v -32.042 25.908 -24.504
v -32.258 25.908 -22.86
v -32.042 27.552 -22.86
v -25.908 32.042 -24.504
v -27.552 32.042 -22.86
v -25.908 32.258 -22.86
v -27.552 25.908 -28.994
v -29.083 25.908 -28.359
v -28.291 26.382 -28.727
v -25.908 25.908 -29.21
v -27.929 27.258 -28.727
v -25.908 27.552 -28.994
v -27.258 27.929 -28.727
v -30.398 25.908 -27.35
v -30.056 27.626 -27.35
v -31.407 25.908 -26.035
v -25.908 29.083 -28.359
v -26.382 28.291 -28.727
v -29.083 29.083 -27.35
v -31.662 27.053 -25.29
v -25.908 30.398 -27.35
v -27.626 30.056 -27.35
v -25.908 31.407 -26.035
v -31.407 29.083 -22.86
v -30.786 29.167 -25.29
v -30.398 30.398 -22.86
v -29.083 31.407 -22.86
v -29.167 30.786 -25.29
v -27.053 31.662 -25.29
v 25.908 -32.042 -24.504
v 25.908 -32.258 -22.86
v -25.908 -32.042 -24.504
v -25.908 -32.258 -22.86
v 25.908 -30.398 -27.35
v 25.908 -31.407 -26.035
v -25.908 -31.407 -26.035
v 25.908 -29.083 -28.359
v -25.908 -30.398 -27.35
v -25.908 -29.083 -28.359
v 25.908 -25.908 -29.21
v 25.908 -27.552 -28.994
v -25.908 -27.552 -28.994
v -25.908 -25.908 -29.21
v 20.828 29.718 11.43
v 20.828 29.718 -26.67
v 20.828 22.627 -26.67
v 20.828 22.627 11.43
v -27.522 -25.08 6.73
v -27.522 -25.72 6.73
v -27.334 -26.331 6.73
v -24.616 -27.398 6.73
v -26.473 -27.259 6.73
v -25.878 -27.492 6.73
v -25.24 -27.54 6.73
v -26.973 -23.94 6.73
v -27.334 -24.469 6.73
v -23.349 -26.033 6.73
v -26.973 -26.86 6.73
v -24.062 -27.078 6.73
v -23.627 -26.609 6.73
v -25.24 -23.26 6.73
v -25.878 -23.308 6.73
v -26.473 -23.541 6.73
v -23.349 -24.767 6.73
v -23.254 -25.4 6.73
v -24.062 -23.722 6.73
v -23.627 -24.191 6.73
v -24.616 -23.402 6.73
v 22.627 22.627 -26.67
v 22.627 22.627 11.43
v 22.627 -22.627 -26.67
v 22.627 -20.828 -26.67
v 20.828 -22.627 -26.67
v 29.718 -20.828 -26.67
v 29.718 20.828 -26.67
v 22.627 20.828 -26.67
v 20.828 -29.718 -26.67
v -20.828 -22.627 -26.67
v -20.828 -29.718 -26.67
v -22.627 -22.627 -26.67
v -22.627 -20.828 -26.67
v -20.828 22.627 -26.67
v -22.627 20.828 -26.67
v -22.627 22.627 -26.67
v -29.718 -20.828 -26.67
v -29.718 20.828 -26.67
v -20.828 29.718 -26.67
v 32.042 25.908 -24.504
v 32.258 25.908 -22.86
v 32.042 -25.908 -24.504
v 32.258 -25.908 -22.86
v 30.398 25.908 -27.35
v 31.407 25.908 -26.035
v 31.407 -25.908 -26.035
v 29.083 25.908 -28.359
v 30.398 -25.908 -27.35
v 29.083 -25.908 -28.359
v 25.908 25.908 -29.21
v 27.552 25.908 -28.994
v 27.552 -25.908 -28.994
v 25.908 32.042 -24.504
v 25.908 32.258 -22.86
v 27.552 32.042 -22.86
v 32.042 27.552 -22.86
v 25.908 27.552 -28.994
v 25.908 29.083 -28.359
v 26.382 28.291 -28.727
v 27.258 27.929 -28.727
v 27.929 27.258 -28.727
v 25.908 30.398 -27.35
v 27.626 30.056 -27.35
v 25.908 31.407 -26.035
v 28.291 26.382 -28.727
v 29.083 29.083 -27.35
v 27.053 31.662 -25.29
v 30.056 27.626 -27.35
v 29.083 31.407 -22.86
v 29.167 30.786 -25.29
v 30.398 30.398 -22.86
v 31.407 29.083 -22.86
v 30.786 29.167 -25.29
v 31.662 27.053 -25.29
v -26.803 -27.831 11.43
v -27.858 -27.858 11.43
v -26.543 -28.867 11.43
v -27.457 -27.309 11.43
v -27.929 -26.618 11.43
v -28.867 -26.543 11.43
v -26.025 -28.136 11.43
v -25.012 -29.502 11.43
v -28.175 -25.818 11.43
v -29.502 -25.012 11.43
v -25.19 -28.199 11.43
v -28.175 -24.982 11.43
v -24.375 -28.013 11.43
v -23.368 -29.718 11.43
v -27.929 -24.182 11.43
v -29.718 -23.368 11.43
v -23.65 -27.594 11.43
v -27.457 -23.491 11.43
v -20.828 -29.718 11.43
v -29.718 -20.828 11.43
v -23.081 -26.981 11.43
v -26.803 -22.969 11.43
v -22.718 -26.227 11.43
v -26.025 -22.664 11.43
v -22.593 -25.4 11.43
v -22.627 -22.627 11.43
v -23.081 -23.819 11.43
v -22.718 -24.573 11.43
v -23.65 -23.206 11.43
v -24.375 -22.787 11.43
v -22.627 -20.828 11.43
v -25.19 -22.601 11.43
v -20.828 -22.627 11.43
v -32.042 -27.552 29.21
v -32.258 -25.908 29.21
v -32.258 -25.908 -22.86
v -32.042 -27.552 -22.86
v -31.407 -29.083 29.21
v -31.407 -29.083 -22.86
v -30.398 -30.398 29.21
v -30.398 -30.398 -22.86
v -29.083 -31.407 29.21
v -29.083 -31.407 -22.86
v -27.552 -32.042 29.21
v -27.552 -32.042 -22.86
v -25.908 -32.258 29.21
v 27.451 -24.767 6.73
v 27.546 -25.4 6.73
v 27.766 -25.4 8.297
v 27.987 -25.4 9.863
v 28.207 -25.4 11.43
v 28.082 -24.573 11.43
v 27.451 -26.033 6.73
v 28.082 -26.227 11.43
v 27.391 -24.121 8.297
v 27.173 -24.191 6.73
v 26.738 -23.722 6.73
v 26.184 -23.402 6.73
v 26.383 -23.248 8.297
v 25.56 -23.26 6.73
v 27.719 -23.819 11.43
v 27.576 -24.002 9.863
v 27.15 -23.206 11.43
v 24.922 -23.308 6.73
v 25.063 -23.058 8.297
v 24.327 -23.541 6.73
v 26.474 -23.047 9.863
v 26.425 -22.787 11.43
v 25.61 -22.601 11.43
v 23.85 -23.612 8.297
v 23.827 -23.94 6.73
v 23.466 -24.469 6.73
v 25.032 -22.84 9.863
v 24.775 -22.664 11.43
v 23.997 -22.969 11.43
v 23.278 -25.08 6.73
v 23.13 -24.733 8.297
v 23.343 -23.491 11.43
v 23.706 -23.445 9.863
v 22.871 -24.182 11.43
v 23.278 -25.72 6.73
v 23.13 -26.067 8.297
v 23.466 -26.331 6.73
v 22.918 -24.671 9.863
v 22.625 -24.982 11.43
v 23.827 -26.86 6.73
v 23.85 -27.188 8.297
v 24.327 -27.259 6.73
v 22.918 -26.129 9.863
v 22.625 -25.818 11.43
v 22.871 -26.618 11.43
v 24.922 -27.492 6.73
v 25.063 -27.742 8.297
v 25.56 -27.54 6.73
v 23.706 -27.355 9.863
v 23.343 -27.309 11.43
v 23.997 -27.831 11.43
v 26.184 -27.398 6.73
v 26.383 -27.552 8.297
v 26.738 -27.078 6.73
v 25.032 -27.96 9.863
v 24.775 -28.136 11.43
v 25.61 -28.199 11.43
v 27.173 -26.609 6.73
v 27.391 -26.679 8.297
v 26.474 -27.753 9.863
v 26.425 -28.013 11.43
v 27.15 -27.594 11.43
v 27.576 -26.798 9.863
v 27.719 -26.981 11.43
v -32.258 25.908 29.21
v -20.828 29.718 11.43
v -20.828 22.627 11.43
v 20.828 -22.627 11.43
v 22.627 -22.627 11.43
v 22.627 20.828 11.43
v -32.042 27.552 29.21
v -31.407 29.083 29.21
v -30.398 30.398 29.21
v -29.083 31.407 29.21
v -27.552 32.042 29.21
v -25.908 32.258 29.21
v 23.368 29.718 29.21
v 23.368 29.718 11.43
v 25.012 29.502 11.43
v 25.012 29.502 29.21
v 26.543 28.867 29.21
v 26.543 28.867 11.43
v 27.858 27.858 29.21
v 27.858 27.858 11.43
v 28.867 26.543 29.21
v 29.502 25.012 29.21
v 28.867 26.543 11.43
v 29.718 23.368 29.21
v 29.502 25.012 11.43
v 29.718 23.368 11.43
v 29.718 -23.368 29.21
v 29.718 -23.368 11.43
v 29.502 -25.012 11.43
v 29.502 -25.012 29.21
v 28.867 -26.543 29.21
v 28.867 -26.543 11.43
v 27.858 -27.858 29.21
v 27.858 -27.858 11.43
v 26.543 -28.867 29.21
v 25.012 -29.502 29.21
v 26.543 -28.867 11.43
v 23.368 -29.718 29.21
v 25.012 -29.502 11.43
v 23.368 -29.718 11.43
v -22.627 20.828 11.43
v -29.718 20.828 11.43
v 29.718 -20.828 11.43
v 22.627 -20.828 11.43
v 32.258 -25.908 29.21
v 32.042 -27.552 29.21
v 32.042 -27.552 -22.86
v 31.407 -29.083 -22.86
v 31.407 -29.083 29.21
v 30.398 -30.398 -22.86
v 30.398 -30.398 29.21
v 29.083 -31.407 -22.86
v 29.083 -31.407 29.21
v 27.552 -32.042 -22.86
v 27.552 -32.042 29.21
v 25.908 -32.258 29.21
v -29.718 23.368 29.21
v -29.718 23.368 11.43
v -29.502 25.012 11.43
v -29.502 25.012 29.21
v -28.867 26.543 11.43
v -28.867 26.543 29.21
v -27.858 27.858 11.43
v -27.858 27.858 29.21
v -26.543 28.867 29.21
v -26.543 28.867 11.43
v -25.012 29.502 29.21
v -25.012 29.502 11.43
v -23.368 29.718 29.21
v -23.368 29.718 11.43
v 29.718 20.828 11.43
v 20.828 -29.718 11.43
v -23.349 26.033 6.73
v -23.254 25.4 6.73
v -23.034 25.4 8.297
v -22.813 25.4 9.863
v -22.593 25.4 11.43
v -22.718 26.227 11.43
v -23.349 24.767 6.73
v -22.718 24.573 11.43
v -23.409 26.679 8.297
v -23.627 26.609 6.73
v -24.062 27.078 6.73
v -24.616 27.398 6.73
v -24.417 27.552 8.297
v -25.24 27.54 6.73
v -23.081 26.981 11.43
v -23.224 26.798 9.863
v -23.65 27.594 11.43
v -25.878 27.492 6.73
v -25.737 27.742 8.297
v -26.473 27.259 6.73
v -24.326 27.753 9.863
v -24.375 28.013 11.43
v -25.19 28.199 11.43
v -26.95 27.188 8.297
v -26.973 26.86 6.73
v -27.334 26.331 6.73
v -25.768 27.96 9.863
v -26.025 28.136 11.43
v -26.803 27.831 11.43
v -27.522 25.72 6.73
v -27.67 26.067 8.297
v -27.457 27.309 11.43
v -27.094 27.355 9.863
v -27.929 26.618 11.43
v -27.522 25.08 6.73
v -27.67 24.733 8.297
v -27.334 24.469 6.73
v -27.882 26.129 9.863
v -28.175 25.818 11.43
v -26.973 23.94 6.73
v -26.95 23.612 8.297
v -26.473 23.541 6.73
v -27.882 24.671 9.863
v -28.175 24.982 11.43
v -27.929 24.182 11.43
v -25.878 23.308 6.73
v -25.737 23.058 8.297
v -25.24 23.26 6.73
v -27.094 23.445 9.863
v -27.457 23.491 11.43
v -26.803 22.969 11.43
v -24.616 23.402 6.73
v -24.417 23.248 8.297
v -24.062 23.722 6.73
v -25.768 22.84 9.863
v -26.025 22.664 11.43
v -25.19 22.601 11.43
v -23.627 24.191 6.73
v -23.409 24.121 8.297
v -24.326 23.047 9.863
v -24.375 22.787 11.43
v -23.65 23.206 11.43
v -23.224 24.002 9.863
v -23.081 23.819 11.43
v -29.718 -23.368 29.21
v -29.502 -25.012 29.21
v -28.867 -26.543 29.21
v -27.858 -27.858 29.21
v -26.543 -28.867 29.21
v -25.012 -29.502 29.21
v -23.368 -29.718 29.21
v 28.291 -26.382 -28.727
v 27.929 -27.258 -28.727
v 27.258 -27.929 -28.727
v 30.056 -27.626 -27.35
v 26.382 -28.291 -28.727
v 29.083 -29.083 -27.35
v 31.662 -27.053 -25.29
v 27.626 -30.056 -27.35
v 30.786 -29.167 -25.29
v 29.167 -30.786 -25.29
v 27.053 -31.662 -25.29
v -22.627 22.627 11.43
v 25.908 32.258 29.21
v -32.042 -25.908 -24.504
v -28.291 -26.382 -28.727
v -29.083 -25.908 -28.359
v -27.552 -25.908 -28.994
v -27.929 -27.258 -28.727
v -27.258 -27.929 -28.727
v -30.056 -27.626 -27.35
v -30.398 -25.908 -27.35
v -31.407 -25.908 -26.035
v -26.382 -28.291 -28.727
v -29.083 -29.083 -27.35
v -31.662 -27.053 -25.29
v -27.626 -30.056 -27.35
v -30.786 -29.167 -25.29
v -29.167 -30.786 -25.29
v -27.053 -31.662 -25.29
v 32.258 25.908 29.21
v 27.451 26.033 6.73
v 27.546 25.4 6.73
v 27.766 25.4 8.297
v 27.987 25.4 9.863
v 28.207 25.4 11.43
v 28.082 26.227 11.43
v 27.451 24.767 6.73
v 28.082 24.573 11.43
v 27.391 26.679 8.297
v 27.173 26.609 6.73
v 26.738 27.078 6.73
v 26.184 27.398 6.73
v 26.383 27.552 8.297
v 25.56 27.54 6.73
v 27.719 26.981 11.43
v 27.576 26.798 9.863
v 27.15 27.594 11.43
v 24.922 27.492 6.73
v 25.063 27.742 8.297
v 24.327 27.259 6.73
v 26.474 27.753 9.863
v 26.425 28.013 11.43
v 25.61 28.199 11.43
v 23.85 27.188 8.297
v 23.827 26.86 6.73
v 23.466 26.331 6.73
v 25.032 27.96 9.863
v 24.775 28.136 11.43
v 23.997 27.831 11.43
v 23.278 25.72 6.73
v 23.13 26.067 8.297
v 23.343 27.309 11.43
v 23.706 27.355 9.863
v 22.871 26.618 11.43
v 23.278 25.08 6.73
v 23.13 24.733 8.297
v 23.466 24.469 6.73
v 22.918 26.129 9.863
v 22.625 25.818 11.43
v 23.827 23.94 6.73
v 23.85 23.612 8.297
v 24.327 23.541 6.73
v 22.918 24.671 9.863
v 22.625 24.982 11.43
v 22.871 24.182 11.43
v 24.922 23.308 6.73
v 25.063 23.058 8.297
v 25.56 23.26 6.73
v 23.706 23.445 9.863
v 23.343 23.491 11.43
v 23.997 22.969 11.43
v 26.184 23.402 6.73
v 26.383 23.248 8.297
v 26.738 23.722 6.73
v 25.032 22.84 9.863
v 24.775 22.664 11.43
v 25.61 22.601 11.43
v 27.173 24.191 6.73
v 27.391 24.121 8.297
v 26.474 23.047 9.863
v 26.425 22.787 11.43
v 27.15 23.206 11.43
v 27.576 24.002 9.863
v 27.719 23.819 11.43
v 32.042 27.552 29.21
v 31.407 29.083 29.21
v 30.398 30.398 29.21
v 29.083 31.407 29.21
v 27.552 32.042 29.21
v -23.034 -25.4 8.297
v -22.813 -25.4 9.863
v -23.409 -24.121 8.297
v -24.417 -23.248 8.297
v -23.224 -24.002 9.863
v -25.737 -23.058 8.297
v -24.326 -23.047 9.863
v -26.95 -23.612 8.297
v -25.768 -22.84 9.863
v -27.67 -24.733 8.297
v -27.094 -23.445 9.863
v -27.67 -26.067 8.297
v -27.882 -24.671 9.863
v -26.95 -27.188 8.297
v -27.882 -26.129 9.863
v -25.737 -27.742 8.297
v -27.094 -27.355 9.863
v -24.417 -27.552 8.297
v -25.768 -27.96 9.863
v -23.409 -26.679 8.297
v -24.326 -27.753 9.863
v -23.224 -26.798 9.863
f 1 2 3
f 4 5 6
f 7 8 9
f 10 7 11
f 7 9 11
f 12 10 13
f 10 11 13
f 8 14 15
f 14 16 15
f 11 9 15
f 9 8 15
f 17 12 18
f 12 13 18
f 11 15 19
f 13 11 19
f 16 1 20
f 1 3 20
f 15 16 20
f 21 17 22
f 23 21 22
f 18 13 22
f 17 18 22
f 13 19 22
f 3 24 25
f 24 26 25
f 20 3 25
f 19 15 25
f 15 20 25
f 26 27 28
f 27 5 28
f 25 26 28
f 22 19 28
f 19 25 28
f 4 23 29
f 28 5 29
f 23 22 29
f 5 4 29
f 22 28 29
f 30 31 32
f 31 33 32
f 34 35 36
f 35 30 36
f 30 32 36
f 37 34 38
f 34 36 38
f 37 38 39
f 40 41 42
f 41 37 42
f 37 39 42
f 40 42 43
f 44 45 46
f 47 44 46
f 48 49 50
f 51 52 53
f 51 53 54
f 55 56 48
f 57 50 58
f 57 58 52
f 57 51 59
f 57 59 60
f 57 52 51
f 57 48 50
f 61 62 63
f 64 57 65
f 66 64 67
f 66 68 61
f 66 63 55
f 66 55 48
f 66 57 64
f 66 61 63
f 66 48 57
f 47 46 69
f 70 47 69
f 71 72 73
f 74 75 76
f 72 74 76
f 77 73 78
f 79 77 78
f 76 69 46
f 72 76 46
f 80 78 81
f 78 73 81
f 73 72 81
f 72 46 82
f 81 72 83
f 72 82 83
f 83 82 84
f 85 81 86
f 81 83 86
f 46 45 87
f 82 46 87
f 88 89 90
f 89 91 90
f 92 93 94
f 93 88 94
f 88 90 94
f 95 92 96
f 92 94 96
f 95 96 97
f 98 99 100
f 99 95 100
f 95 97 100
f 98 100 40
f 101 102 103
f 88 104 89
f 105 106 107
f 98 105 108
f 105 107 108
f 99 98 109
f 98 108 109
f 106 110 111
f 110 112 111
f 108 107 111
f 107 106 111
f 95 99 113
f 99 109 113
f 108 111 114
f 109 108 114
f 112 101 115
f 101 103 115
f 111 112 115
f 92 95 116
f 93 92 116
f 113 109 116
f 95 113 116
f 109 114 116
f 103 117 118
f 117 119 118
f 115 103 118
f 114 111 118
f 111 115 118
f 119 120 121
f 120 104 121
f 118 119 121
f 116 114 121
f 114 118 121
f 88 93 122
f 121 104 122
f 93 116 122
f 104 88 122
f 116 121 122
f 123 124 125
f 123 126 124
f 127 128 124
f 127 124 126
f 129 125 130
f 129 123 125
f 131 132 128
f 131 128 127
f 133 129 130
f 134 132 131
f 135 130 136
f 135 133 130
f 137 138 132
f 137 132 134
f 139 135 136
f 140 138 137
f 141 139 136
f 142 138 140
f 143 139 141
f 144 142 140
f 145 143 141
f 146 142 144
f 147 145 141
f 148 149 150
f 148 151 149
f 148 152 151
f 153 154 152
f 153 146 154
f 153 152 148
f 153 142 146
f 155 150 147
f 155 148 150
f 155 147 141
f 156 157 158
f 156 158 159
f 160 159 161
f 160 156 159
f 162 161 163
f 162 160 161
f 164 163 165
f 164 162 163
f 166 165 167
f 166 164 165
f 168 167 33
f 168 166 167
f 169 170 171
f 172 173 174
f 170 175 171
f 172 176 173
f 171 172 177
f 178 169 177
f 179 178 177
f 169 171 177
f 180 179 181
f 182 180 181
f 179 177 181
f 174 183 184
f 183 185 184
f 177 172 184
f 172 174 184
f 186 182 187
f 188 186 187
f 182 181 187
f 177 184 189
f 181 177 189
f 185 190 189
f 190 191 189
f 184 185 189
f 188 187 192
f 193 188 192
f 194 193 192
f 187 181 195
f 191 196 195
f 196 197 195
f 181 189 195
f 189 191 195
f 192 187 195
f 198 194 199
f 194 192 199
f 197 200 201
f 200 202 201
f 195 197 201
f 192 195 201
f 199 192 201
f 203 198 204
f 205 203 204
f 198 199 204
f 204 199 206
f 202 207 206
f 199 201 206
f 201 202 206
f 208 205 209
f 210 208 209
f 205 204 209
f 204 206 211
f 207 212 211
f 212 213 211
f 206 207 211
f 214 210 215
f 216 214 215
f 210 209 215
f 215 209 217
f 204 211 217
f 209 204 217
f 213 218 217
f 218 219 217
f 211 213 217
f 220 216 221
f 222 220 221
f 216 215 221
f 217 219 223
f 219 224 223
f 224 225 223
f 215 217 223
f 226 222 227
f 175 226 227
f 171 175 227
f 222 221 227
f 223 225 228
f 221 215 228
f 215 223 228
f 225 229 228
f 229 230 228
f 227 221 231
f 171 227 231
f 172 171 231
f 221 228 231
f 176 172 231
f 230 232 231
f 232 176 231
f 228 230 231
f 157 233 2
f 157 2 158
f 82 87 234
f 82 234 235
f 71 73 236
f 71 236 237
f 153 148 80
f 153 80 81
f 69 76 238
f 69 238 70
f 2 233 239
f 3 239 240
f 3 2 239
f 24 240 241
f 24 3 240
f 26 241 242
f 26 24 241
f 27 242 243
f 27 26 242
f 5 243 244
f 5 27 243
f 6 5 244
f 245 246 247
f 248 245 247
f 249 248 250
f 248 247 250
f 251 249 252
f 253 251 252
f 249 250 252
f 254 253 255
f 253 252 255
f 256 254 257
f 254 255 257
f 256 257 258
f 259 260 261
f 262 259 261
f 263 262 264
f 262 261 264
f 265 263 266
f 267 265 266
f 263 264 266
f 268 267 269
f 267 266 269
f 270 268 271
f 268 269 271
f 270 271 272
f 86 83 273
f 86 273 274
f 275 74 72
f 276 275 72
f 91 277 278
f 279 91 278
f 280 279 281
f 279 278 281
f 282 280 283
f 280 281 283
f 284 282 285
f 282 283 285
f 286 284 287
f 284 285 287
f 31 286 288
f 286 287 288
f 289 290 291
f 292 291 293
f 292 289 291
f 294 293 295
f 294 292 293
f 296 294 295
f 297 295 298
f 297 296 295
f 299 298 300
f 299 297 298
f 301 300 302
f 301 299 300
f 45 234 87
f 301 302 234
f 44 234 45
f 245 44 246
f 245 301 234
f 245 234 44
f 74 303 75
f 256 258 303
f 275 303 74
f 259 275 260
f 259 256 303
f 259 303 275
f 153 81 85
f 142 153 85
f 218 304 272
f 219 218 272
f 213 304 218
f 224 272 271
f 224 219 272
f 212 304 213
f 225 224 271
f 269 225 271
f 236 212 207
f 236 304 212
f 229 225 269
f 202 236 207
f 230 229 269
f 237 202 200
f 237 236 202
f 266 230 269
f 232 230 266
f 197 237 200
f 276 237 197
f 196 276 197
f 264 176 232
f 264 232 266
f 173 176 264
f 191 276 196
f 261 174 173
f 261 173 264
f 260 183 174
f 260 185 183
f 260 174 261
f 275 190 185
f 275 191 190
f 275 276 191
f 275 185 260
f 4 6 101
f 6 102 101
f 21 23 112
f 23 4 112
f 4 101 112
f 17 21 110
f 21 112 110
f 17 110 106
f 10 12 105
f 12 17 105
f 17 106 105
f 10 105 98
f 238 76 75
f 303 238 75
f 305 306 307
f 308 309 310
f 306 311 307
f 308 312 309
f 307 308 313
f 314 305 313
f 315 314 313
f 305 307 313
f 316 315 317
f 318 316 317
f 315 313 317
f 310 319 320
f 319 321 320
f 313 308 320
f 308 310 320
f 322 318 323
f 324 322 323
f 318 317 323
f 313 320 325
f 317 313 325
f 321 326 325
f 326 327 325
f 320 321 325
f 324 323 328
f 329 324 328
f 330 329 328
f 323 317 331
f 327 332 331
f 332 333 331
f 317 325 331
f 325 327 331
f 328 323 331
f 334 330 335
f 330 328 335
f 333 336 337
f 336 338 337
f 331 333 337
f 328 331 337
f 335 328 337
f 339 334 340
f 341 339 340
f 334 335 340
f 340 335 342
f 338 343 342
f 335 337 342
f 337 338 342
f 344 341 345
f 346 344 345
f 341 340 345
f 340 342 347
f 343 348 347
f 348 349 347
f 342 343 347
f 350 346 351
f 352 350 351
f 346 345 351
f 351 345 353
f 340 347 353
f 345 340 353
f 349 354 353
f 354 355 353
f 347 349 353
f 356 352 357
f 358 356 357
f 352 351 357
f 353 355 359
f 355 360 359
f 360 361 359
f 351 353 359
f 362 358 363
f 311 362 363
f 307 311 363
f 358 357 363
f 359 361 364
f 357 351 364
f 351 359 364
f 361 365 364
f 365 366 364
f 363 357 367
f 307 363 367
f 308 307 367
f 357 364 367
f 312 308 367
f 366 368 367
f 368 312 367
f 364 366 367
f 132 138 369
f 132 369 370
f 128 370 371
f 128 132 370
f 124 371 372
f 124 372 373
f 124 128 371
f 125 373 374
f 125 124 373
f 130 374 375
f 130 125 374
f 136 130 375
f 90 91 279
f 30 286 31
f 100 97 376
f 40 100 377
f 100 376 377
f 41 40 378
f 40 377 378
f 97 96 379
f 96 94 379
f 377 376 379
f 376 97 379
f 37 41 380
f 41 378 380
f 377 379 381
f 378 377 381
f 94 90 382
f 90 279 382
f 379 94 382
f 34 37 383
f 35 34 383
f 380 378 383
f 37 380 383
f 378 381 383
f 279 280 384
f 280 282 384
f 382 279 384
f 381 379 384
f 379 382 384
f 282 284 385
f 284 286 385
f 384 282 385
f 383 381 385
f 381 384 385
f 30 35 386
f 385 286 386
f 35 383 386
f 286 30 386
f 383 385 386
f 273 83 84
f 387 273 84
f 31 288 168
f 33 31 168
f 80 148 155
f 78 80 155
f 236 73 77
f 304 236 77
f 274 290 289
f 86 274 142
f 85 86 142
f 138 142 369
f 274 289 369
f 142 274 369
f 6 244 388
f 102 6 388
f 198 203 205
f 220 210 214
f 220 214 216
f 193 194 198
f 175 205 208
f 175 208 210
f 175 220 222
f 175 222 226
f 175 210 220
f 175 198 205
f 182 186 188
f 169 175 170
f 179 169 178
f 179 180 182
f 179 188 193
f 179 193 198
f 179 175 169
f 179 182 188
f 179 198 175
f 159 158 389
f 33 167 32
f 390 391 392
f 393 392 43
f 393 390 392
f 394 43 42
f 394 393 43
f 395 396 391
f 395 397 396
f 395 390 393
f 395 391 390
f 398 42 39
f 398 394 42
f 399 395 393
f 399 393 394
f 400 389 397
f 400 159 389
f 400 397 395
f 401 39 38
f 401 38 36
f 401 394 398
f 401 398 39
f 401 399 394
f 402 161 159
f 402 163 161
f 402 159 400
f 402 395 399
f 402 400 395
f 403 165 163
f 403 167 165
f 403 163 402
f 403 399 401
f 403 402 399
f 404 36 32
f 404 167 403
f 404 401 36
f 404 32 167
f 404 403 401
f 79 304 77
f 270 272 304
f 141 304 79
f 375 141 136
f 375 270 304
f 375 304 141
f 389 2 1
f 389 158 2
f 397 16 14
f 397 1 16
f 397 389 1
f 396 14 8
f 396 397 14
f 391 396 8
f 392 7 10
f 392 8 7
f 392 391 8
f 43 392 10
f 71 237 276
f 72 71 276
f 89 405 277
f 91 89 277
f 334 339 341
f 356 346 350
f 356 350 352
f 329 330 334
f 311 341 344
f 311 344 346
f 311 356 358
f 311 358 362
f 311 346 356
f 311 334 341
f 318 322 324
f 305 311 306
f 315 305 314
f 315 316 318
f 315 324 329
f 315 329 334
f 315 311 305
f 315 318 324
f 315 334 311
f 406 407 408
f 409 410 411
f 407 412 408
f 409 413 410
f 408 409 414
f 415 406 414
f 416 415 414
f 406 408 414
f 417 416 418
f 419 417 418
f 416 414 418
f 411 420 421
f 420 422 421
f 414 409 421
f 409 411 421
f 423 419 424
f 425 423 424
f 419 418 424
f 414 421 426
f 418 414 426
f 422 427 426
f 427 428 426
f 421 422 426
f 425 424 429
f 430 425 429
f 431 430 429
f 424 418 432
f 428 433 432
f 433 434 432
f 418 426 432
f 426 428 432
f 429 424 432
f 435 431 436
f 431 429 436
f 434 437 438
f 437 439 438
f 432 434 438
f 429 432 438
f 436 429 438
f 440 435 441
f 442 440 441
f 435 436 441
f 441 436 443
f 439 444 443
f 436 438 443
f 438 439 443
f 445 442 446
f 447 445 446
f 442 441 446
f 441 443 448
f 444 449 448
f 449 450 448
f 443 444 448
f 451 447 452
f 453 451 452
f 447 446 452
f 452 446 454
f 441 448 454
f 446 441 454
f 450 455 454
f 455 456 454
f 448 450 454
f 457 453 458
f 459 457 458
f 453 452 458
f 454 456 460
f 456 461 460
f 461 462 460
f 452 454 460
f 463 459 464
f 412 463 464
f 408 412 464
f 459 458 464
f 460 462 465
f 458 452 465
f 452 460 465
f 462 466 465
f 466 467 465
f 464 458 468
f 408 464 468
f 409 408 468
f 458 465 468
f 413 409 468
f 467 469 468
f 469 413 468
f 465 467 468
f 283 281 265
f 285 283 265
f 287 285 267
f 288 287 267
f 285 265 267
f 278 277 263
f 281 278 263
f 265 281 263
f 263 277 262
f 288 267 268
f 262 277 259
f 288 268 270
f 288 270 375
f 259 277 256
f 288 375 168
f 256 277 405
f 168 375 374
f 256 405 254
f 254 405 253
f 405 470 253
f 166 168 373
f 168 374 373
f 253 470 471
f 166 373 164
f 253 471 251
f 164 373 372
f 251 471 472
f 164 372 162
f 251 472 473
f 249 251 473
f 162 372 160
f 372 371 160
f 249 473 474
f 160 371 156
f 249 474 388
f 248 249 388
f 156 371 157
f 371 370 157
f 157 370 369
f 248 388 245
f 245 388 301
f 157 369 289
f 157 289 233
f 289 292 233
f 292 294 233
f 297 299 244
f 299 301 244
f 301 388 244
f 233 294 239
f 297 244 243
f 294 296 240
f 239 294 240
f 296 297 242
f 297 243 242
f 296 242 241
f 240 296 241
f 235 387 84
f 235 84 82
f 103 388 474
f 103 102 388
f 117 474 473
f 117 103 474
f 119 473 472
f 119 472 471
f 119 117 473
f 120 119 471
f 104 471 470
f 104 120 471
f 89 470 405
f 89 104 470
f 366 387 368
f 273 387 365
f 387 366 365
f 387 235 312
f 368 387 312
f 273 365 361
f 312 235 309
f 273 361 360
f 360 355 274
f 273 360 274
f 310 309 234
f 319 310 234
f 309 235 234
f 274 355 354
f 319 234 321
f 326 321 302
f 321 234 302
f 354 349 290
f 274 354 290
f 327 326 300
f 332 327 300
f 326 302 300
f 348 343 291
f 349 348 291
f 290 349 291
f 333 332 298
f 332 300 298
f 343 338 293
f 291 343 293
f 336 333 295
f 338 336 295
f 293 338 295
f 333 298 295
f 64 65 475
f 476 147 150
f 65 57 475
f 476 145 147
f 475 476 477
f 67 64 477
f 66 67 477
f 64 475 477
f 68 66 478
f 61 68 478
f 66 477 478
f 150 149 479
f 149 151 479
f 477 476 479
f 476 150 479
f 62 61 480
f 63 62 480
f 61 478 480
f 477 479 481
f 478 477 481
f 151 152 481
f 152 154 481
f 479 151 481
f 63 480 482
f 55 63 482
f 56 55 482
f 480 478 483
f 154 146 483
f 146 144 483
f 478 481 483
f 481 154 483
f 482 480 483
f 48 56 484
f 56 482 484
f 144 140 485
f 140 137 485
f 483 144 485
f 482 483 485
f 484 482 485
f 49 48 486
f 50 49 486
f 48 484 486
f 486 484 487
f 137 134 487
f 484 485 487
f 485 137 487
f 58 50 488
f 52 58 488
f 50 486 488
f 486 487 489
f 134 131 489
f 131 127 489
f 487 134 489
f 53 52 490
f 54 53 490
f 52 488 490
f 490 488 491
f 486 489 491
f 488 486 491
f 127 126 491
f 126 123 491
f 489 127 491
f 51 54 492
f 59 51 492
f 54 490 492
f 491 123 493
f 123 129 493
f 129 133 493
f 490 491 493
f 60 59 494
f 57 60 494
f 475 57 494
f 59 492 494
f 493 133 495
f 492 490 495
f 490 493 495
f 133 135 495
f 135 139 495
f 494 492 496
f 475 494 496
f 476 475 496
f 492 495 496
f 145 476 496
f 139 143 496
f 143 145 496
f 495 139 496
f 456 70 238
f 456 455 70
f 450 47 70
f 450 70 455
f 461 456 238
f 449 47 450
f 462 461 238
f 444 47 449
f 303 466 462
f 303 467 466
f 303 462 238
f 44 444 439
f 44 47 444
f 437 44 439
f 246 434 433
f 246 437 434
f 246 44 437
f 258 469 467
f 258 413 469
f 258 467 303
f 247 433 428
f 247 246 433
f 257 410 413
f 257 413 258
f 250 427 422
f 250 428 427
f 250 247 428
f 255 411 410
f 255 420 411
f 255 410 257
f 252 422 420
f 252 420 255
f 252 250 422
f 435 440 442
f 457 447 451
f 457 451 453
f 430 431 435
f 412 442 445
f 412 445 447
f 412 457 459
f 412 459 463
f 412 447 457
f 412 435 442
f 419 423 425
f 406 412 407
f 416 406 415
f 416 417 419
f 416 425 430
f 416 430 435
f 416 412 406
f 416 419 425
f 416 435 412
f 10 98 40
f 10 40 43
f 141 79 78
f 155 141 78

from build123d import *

# Parameters (mm, degrees)
BOSS_EXTRUDE1_DEPTH          = 29.21
SHELL1_T                     = -2.54
FILLET1_R                    = 6.35
BOSS_EXTRUDE2_DEPTH          = 38.1
SKETCH3_R                    = 2.8067
CUT_EXTRUDE1_DEPTH           = 4.7
CUT_EXTRUDE1_DRAFT           = -8
CUT_EXTRUDE1_PROFILE_2_DEPTH = 4.7
CUT_EXTRUDE1_PROFILE_2_DRAFT = -8
CUT_EXTRUDE1_PROFILE_3_DEPTH = 4.7
CUT_EXTRUDE1_PROFILE_3_DRAFT = -8
CUT_EXTRUDE1_PROFILE_4_DEPTH = 4.7
CUT_EXTRUDE1_PROFILE_4_DRAFT = -8
SKETCH5_W                    = 45.253999916
SKETCH5_H                    = 45.253999916
CUT_EXTRUDE5_DEPTH           = 38.1


with BuildPart() as part:
    # Sketch1 → Boss-Extrude1 (new, symmetric)
    with BuildSketch(Plane.XY):
        Polygon((-32.258, -32.258), (-32.258, -11.938), (-32.258, 11.938), (-32.258, 32.258), (32.258, 32.258), (32.258, -32.258), align=None)
    extrude(amount=BOSS_EXTRUDE1_DEPTH, both=True)

    # Shell1
    shell1_openings = [part.faces().sort_by_distance(p)[0] for p in [
        (0, 0, 29.21),
    ]]
    offset(amount=SHELL1_T, openings=shell1_openings, kind=Kind.INTERSECTION)

    # Fillet1
    fillet1_edges = [part.edges().sort_by_distance(p)[0] for p in [
        (-32.258, -32.258, 0),
        (-32.258, 32.258, 0),
        (32.258, 32.258, 0),
        (32.258, -32.258, 0),
        (-29.718, -29.718, 1.27),
        (29.718, -29.718, 1.27),
        (29.718, 29.718, 1.27),
        (-29.718, 29.718, 1.27),
        (-32.258, 0, -29.21),
        (0, 32.258, -29.21),
        (32.258, 0, -29.21),
        (0, -32.258, -29.21),
    ]]
    fillet(fillet1_edges, radius=FILLET1_R)

    # Sketch2 → Boss-Extrude2 (add)
    with BuildSketch(Plane.XY.offset(-26.67)):
        with BuildLine():
            Line((-20.828, -20.828), (-29.718, -20.828))
            Line((-29.718, -20.828), (-29.718, -23.368))
            ThreePointArc((-29.718, -23.368), (-27.858128061, -27.858128061), (-23.368, -29.718))
            Line((-23.368, -29.718), (-20.828, -29.718))
            Line((-20.828, -29.718), (-20.828, -20.828))
        make_face()
        with BuildLine():
            ThreePointArc((-29.718, 23.368), (-27.858128061, 27.858128061), (-23.368, 29.718))
            Line((-23.368, 29.718), (-20.828, 29.718))
            Line((-20.828, 29.718), (-20.828, 20.828))
            Line((-20.828, 20.828), (-29.718, 20.828))
            Line((-29.718, 20.828), (-29.718, 23.368))
        make_face()
        with BuildLine():
            ThreePointArc((29.718, 23.368), (27.858128061, 27.858128061), (23.368, 29.718))
            Line((23.368, 29.718), (20.828, 29.718))
            Line((20.828, 29.718), (20.828, 20.828))
            Line((20.828, 20.828), (29.718, 20.828))
            Line((29.718, 20.828), (29.718, 23.368))
        make_face()
        with BuildLine():
            ThreePointArc((23.368, -29.718), (27.858128061, -27.858128061), (29.718, -23.368))
            Line((29.718, -23.368), (29.718, -20.828))
            Line((29.718, -20.828), (20.828, -20.828))
            Line((20.828, -20.828), (20.828, -29.718))
            Line((20.828, -29.718), (23.368, -29.718))
        make_face()
    extrude(amount=BOSS_EXTRUDE2_DEPTH)


with BuildPart() as cut_extrude1_tool:
    # Sketch3 → Cut-Extrude1 (with draft: the straight prism first)
    with BuildSketch(Plane.XY.offset(11.43)):
        with Locations((-25.4, -25.4)):
            Circle(SKETCH3_R)
    extrude(amount=-CUT_EXTRUDE1_DEPTH)
    # Cut-Extrude1: the draft: its side faces are tilted about the plane it starts from
    cut_extrude1_sides = [cut_extrude1_tool.faces().sort_by_distance(p)[0] for p in [
        (-28.2067, -25.4, 9.08),
    ]]
    draft(cut_extrude1_sides, Plane.XY.offset(11.43), CUT_EXTRUDE1_DRAFT)


with BuildPart() as part_1:
    add(part.part)

    # Cut-Extrude1: cut by cut_extrude1_tool
    add(cut_extrude1_tool.part, mode=Mode.SUBTRACT)


with BuildPart() as cut_extrude1_profile_2_tool:
    # Sketch3 → Cut-Extrude1 profile 2 (with draft: the straight prism first)
    with BuildSketch(Plane.XY.offset(11.43)):
        with Locations((-25.4, 25.4)):
            Circle(SKETCH3_R)
    extrude(amount=-CUT_EXTRUDE1_PROFILE_2_DEPTH)
    # Cut-Extrude1 profile 2: the draft: its side faces are tilted about the plane it starts from
    cut_extrude1_profile_2_sides = [cut_extrude1_profile_2_tool.faces().sort_by_distance(p)[0] for p in [
        (-28.2067, 25.4, 9.08),
    ]]
    draft(cut_extrude1_profile_2_sides, Plane.XY.offset(11.43), CUT_EXTRUDE1_PROFILE_2_DRAFT)


with BuildPart() as part_2:
    add(part_1.part)

    # Cut-Extrude1 profile 2: cut by cut_extrude1_profile_2_tool
    add(cut_extrude1_profile_2_tool.part, mode=Mode.SUBTRACT)


with BuildPart() as cut_extrude1_profile_3_tool:
    # Sketch3 → Cut-Extrude1 profile 3 (with draft: the straight prism first)
    with BuildSketch(Plane.XY.offset(11.43)):
        with Locations((25.4, 25.4)):
            Circle(SKETCH3_R)
    extrude(amount=-CUT_EXTRUDE1_PROFILE_3_DEPTH)
    # Cut-Extrude1 profile 3: the draft: its side faces are tilted about the plane it starts from
    cut_extrude1_profile_3_sides = [cut_extrude1_profile_3_tool.faces().sort_by_distance(p)[0] for p in [
        (22.5933, 25.4, 9.08),
    ]]
    draft(cut_extrude1_profile_3_sides, Plane.XY.offset(11.43), CUT_EXTRUDE1_PROFILE_3_DRAFT)


with BuildPart() as part_3:
    add(part_2.part)

    # Cut-Extrude1 profile 3: cut by cut_extrude1_profile_3_tool
    add(cut_extrude1_profile_3_tool.part, mode=Mode.SUBTRACT)


with BuildPart() as cut_extrude1_profile_4_tool:
    # Sketch3 → Cut-Extrude1 profile 4 (with draft: the straight prism first)
    with BuildSketch(Plane.XY.offset(11.43)):
        with Locations((25.4, -25.4)):
            Circle(SKETCH3_R)
    extrude(amount=-CUT_EXTRUDE1_PROFILE_4_DEPTH)
    # Cut-Extrude1 profile 4: the draft: its side faces are tilted about the plane it starts from
    cut_extrude1_profile_4_sides = [cut_extrude1_profile_4_tool.faces().sort_by_distance(p)[0] for p in [
        (22.5933, -25.4, 9.08),
    ]]
    draft(cut_extrude1_profile_4_sides, Plane.XY.offset(11.43), CUT_EXTRUDE1_PROFILE_4_DRAFT)


with BuildPart() as part_4:
    add(part_3.part)

    # Cut-Extrude1 profile 4: cut by cut_extrude1_profile_4_tool
    add(cut_extrude1_profile_4_tool.part, mode=Mode.SUBTRACT)

    # Sketch5 → Cut-Extrude5 (cut)
    with BuildSketch(Plane.XY.offset(11.43)):
        Rectangle(SKETCH5_W, SKETCH5_H)
    extrude(amount=-CUT_EXTRUDE5_DEPTH, mode=Mode.SUBTRACT)


solid = part_4.part
